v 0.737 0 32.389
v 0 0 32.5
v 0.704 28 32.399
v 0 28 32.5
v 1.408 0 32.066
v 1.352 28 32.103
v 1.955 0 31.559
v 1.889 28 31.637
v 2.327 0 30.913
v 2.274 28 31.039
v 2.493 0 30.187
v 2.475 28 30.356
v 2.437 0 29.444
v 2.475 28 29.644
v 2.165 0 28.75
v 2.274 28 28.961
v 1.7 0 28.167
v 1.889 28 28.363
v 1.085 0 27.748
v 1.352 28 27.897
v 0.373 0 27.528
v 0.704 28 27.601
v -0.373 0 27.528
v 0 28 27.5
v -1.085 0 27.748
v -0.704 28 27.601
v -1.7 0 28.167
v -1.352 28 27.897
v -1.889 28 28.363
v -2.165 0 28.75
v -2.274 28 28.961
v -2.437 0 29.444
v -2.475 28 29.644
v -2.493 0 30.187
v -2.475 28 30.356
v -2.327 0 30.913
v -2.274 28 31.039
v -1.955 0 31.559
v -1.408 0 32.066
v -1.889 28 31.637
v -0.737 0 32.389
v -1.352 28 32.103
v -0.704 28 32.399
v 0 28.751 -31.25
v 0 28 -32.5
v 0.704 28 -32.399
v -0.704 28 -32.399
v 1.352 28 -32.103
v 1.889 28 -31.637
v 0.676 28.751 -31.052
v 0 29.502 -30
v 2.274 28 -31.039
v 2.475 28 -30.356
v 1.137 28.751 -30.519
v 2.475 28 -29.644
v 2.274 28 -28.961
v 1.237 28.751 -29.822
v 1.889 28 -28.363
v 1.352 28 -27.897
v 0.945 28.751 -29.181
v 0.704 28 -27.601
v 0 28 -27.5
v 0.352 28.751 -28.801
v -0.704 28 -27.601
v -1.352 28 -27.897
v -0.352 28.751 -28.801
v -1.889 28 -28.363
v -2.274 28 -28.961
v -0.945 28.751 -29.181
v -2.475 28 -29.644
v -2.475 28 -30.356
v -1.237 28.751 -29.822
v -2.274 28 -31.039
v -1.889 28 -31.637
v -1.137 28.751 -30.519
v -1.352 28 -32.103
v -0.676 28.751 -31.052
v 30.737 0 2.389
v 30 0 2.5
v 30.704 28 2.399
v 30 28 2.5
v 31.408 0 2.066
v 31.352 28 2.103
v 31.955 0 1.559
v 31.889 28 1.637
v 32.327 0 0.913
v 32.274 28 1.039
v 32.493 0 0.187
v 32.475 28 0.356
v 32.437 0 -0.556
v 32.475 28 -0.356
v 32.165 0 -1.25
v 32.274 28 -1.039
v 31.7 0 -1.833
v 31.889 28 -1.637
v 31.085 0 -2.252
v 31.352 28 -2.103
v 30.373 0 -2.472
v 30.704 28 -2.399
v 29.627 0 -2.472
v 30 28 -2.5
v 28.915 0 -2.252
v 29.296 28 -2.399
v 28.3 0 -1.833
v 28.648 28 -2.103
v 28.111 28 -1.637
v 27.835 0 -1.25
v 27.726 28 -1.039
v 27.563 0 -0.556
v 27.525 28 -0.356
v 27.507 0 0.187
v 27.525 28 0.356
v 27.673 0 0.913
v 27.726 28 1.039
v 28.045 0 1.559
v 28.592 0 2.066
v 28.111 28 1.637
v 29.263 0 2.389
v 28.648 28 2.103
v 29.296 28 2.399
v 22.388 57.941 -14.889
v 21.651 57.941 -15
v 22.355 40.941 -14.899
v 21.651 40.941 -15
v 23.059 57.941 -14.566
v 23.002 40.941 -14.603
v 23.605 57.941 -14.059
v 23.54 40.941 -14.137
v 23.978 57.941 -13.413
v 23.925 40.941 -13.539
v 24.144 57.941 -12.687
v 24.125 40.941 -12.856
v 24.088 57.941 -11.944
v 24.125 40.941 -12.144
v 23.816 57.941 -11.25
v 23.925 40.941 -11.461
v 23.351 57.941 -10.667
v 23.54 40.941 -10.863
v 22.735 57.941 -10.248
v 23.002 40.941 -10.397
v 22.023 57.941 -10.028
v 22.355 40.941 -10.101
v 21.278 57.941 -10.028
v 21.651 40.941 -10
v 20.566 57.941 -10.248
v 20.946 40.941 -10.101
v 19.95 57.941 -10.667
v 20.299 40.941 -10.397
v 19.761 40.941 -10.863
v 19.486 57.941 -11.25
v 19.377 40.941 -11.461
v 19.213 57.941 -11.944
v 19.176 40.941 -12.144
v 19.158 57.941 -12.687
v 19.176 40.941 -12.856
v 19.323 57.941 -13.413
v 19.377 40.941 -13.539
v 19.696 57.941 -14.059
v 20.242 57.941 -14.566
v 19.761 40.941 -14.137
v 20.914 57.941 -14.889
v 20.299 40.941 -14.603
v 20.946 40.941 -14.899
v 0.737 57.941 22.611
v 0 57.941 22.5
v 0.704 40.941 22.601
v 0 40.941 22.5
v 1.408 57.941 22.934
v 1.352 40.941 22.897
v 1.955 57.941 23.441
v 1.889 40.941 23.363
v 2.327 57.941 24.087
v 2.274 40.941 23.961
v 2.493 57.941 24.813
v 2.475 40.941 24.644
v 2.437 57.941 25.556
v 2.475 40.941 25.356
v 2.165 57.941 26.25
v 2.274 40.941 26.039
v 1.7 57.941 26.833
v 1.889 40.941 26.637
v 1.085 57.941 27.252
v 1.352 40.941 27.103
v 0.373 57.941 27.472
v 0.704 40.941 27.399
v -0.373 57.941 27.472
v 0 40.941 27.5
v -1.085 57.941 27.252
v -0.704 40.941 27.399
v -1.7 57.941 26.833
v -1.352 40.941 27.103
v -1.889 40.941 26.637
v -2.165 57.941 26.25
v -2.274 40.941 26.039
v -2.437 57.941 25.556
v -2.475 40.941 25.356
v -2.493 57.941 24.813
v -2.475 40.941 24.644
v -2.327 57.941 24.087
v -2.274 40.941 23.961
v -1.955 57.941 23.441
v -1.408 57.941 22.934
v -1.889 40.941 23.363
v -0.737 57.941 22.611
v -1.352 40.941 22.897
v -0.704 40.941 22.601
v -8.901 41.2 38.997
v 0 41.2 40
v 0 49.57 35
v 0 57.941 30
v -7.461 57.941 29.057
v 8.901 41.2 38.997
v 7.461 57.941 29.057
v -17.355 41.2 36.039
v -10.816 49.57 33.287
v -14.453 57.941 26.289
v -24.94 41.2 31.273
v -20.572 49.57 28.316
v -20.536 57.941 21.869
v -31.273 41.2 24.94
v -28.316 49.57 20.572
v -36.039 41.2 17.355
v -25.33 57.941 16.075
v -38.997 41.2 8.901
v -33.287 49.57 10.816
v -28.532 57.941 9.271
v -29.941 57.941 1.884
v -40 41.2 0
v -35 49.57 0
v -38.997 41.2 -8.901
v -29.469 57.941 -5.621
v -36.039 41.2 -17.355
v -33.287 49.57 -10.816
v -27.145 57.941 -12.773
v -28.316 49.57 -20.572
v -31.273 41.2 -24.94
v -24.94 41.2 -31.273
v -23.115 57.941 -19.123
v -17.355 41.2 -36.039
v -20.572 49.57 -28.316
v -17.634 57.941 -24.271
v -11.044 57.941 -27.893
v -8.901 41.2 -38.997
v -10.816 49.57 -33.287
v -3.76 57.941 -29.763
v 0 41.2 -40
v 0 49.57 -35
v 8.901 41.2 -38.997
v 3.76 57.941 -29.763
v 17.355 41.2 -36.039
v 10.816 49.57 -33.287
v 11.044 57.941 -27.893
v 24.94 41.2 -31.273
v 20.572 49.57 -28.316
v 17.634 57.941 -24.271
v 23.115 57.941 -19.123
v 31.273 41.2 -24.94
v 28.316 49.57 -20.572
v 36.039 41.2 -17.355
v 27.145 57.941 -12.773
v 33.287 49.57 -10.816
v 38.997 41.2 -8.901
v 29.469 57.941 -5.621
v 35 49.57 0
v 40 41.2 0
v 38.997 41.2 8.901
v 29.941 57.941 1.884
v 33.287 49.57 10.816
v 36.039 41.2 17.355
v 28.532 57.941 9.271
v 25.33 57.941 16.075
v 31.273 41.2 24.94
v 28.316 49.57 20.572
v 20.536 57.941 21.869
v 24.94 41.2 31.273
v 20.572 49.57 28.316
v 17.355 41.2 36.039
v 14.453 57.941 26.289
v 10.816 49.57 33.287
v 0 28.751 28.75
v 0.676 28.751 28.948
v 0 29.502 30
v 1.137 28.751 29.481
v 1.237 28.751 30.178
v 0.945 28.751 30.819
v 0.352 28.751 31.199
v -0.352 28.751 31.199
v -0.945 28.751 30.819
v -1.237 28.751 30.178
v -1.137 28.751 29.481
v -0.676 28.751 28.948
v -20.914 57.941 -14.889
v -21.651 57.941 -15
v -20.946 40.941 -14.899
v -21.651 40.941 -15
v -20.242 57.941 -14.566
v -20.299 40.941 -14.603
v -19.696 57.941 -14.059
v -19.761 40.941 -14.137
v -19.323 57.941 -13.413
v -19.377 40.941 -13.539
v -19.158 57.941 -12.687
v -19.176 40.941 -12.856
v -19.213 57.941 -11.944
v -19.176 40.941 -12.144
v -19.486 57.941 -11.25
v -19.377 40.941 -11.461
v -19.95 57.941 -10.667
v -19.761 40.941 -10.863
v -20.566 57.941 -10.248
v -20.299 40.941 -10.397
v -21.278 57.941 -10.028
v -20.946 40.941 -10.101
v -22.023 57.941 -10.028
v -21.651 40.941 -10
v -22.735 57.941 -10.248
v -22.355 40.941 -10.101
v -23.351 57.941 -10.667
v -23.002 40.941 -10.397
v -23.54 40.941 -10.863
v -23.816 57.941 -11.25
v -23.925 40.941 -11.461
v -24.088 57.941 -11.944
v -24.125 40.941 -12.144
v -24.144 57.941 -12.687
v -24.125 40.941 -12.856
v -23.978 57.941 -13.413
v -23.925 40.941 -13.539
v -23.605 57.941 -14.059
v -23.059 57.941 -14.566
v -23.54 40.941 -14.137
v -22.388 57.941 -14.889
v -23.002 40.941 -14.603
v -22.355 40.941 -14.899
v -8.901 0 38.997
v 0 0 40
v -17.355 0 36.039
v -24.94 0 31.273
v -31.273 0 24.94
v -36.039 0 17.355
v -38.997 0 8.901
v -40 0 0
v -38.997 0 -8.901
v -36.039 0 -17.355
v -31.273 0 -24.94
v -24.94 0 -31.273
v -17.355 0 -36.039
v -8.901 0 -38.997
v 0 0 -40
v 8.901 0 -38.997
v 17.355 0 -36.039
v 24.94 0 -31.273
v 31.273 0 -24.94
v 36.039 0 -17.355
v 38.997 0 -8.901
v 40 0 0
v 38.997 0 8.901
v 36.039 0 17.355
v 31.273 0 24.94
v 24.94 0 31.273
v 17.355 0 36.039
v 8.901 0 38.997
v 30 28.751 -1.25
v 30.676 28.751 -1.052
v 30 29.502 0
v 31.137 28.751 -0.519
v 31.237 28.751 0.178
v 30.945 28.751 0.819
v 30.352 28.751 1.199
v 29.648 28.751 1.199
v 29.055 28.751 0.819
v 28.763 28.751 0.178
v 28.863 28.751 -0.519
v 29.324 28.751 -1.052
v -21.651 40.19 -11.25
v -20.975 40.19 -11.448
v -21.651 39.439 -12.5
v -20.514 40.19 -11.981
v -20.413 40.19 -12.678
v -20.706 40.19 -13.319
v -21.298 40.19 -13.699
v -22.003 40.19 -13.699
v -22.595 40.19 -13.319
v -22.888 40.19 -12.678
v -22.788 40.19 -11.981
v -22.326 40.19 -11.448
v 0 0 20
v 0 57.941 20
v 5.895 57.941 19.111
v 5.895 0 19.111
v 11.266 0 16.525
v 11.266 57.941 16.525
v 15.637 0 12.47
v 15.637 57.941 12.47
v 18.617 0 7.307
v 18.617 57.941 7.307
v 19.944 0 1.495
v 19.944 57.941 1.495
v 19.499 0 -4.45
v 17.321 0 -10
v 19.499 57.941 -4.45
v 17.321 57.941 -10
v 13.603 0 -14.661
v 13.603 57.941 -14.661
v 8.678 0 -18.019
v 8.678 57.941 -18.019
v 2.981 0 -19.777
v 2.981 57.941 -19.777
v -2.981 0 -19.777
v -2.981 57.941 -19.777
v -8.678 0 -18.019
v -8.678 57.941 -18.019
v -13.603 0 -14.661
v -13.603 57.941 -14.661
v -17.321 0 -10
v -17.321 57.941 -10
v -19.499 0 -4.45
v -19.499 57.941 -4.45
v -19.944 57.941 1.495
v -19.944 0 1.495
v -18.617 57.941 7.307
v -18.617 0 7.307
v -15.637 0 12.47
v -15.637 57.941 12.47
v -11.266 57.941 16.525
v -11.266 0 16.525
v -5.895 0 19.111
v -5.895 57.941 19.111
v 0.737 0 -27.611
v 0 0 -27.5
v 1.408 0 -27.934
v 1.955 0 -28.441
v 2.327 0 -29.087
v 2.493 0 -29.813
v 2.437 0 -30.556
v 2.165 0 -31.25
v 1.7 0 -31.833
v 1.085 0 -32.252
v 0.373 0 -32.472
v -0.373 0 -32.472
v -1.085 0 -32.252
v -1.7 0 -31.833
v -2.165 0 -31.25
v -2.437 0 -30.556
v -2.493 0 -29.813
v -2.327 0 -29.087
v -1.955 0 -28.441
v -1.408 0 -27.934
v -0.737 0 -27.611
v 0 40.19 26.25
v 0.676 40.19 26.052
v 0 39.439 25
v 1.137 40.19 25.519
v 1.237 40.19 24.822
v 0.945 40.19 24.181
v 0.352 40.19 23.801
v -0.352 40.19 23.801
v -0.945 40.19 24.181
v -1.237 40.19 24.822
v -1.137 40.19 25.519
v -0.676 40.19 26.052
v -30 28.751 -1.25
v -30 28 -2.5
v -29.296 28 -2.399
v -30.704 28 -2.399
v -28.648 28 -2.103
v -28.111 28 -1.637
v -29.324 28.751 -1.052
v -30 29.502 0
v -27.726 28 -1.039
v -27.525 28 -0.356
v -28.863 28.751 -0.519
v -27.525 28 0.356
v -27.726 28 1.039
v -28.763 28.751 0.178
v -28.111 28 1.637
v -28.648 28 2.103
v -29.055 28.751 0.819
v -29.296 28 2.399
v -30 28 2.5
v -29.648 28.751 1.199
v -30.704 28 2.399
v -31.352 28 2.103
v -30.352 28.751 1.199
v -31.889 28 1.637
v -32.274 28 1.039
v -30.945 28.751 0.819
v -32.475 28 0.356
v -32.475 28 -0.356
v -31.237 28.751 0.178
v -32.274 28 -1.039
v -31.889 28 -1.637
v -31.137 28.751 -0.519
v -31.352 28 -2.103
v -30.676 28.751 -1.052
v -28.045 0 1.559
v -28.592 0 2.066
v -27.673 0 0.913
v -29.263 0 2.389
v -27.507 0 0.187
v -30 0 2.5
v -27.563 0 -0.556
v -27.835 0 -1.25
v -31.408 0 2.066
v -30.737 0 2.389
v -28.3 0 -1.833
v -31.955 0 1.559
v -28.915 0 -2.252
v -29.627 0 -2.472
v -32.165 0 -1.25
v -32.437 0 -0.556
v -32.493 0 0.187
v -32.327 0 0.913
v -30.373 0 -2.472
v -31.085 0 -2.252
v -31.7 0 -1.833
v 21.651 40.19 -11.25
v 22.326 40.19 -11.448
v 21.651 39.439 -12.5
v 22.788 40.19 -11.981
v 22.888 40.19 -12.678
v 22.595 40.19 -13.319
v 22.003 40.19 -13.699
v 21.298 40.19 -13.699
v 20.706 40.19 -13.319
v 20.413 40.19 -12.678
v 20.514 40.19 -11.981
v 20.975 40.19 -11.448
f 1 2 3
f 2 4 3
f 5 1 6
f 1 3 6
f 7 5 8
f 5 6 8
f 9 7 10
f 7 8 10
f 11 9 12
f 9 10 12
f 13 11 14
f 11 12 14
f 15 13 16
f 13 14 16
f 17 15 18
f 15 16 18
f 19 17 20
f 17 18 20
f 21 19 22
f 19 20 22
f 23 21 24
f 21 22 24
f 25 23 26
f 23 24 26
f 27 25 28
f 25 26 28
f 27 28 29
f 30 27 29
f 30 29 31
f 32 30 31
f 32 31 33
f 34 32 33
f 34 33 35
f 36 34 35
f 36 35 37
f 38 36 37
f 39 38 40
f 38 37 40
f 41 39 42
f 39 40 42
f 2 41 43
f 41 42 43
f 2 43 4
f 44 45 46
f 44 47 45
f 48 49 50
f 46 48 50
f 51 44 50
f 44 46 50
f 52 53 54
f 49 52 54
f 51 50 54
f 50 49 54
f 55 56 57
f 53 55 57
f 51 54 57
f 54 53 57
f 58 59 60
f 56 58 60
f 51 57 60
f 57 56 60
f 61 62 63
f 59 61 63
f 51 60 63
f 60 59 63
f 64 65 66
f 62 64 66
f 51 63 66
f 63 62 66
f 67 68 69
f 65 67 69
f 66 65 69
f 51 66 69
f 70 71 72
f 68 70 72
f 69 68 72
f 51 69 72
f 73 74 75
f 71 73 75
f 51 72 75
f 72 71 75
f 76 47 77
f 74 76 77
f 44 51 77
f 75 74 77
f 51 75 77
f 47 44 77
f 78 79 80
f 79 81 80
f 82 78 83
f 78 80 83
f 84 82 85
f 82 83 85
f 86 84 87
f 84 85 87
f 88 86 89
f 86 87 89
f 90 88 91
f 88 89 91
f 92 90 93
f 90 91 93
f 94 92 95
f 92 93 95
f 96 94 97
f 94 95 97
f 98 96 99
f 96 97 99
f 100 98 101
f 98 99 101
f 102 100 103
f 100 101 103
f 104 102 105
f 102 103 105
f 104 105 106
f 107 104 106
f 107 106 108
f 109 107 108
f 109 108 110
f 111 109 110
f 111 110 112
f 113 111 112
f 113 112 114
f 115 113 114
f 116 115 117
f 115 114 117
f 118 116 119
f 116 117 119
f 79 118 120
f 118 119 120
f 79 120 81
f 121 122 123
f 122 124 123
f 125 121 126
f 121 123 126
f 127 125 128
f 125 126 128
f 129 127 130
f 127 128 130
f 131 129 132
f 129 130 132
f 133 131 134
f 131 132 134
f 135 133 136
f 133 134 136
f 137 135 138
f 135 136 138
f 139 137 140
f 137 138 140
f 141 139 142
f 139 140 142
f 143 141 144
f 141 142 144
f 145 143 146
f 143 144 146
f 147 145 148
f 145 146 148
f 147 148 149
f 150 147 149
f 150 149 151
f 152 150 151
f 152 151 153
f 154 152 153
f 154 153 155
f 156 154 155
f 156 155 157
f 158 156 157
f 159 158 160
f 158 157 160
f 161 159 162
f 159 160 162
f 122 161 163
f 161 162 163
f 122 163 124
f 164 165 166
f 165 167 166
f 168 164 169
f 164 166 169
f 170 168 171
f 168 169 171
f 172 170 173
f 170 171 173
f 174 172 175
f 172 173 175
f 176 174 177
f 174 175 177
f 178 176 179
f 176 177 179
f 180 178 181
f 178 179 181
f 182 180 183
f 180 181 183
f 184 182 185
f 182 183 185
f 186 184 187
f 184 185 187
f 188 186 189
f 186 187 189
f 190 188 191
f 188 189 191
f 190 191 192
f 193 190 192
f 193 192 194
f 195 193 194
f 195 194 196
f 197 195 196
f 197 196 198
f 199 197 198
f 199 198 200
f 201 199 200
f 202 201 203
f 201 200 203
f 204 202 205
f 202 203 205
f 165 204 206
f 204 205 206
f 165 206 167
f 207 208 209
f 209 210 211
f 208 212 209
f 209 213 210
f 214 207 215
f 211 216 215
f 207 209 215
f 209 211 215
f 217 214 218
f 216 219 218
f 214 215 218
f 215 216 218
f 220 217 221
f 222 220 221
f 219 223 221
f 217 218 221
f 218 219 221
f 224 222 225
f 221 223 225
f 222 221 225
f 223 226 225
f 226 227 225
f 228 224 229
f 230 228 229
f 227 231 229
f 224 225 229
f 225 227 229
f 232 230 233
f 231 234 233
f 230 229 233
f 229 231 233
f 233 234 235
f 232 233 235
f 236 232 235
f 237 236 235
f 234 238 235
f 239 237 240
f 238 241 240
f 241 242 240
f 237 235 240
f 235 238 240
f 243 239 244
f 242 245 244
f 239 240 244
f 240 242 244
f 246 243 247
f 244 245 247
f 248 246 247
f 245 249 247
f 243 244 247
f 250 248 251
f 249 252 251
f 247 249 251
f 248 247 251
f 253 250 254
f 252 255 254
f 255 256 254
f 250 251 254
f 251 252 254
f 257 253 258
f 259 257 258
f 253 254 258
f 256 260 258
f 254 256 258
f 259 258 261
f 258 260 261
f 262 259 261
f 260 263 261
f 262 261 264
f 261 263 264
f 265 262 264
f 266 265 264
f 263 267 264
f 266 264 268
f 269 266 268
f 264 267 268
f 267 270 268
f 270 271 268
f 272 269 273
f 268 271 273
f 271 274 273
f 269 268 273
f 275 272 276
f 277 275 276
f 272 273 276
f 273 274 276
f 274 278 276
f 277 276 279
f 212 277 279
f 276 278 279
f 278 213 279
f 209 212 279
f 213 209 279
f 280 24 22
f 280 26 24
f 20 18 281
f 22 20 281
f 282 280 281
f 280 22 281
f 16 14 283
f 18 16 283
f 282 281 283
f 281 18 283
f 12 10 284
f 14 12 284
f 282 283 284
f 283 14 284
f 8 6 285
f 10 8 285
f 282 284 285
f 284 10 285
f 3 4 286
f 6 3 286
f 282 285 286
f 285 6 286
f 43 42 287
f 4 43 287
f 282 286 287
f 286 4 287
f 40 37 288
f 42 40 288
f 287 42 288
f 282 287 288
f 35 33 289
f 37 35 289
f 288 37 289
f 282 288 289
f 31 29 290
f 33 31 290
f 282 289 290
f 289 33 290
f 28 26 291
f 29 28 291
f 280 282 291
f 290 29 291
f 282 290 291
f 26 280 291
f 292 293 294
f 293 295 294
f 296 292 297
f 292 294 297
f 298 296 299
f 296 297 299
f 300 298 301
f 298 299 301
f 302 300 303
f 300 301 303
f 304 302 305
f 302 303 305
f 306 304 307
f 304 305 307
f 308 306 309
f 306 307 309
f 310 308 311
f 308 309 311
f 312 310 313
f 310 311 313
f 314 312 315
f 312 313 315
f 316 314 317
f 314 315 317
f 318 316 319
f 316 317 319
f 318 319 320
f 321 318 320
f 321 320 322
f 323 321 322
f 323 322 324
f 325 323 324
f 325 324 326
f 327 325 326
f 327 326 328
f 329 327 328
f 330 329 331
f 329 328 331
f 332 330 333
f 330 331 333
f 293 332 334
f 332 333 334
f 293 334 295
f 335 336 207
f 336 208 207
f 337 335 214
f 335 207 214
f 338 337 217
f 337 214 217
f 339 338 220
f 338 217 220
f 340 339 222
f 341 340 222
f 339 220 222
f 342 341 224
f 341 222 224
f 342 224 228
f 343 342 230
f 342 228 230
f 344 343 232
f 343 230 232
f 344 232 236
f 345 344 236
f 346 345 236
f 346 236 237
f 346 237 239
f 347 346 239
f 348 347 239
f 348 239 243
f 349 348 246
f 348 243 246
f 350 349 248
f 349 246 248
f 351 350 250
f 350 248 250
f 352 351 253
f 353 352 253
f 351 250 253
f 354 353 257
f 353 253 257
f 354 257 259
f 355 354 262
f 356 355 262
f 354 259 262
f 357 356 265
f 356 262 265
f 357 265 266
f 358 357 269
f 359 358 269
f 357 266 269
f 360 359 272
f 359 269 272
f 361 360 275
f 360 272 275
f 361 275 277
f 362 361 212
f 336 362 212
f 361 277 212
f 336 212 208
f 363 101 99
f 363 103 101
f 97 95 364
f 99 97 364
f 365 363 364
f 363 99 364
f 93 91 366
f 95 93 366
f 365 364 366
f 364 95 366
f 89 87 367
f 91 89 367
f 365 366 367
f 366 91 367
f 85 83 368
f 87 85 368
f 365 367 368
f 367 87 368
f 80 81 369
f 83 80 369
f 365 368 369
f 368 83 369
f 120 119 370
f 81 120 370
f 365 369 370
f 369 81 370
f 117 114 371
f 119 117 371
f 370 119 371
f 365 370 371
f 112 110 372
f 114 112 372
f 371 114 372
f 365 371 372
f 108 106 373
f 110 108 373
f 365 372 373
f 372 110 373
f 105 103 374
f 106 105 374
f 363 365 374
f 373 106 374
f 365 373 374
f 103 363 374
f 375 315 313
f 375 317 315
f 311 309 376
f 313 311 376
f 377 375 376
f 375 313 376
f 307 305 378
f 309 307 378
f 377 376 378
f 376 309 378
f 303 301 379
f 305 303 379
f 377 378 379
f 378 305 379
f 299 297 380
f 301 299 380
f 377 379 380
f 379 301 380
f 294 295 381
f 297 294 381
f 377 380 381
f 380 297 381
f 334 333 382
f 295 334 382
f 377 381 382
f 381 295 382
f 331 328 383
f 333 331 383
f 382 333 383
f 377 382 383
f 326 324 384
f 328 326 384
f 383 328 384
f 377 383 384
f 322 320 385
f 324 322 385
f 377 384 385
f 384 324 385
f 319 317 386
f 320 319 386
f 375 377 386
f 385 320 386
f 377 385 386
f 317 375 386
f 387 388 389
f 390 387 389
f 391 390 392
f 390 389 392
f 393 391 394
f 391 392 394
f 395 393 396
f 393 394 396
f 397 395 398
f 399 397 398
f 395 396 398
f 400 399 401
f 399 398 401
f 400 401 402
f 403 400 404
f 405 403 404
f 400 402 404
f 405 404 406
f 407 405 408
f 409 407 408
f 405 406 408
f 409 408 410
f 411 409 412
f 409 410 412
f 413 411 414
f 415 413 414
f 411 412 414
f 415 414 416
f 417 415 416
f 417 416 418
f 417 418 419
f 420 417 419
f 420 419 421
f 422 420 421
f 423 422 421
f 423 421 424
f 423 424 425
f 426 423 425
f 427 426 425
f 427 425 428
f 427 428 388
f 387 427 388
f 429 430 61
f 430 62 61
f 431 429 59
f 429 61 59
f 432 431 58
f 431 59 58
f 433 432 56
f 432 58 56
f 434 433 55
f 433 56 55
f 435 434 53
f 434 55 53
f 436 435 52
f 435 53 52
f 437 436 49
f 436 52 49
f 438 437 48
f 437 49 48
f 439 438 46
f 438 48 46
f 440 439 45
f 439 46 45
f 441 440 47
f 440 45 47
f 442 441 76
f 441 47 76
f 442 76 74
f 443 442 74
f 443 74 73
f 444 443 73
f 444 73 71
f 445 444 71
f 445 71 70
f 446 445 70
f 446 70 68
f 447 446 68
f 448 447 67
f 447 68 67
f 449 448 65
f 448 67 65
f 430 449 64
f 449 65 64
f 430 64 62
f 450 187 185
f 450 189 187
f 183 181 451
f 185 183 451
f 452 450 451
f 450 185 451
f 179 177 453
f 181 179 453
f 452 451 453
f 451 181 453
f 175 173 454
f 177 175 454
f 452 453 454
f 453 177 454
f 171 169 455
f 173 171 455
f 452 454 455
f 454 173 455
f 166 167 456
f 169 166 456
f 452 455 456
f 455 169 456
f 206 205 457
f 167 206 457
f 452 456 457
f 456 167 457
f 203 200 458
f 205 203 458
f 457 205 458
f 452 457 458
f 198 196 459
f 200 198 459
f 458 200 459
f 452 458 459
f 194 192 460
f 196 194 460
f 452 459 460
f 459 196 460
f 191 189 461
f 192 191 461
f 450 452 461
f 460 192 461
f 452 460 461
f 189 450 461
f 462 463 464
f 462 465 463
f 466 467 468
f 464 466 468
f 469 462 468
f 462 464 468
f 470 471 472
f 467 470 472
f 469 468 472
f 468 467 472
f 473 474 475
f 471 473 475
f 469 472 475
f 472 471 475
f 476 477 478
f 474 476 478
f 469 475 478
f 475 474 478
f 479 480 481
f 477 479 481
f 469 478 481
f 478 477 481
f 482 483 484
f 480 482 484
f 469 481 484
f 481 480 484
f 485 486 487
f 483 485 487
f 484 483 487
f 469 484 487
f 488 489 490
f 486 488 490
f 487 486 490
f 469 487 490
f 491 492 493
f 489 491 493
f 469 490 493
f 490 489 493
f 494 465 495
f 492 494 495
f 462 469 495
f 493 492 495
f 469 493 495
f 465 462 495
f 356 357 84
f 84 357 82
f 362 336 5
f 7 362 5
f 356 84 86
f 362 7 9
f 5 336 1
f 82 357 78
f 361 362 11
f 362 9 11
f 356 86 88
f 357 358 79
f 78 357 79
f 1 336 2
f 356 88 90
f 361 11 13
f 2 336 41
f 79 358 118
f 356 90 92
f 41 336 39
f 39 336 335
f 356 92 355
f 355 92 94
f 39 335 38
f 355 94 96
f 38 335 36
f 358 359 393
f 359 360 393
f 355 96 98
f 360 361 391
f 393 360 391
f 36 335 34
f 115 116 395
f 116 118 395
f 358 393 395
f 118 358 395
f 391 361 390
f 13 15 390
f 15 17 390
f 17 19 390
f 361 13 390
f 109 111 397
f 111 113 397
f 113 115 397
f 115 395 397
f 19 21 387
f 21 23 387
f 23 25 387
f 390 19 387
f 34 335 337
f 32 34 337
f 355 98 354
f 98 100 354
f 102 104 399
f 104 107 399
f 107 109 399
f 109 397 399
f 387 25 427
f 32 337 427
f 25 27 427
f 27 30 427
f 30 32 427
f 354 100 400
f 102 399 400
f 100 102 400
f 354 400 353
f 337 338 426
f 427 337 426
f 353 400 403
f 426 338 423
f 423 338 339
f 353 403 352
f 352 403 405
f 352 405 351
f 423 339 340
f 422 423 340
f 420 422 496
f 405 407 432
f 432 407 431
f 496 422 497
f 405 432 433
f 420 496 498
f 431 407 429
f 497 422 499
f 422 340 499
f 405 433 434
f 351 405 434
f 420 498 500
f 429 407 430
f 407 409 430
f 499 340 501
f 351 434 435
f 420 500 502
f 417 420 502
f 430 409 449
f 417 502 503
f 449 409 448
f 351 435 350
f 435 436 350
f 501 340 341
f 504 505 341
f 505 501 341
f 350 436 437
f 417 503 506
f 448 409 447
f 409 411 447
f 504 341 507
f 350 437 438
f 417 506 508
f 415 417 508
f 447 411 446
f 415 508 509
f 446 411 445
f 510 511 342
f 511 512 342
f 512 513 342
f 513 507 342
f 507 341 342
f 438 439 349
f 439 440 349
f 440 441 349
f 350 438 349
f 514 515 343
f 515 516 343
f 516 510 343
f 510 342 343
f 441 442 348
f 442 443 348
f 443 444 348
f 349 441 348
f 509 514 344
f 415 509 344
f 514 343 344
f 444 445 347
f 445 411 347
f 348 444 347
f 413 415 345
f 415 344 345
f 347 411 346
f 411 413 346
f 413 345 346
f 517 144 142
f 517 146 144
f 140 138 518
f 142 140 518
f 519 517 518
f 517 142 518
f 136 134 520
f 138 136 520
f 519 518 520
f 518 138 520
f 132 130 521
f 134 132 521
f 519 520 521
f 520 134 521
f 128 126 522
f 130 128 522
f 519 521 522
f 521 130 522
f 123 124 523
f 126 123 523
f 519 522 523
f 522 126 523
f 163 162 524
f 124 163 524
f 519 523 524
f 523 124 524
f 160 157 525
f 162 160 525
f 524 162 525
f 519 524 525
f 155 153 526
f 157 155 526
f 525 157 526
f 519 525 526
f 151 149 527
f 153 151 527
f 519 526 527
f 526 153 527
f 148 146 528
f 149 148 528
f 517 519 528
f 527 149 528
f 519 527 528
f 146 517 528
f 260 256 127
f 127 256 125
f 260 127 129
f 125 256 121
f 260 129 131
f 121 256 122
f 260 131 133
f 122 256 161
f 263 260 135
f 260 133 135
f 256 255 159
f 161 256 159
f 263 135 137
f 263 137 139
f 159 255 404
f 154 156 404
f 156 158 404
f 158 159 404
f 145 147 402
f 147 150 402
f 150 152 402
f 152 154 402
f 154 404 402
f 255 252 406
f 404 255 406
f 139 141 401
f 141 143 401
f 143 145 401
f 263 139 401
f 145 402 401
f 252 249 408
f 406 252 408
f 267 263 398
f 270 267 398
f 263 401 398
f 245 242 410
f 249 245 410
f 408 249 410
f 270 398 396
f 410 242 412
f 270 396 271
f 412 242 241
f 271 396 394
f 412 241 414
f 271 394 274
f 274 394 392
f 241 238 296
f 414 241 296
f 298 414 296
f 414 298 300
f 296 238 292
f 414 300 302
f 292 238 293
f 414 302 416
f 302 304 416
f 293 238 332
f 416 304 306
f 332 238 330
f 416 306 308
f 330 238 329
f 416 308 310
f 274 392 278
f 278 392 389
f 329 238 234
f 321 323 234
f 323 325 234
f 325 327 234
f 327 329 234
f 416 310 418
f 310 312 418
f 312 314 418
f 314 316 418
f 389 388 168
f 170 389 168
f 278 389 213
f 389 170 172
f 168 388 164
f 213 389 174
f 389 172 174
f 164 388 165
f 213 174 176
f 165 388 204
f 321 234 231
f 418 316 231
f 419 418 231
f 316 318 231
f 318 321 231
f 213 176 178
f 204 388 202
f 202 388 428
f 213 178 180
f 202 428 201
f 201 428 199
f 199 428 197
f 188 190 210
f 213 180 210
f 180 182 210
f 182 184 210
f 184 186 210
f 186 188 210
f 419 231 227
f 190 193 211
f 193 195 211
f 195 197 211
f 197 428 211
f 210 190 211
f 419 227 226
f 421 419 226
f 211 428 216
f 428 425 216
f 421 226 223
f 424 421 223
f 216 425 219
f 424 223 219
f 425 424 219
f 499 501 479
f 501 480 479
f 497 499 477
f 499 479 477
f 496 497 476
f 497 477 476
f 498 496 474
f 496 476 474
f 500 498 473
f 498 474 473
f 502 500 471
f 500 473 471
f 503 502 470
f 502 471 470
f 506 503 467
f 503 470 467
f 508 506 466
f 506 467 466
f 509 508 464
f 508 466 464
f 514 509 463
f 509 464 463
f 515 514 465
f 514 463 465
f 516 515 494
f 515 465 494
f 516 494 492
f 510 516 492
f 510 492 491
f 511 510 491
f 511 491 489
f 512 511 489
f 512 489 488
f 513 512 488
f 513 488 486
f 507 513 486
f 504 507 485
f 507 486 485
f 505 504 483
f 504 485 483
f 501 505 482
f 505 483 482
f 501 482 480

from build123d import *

# Parameters (mm, degrees)
ESQUISSE2_R             = 20
ENL_V_MAT_EXTRU_1_DEPTH = 58.940669043
TROU_TARAUD_M61_D       = 5
TROU_TARAUD_M61_DEPTH   = 17
TROU_TARAUD_M61_TIP     = 1.502151548
TROU_TARAUD_M62_D       = 5
TROU_TARAUD_M62_DEPTH   = 28
TROU_TARAUD_M62_TIP     = 1.502151548


with BuildPart() as part:
    # Esquisse1 → Révolution1 (revolve)
    with BuildSketch(Plane.XY, mode=Mode.PRIVATE) as r_volution1_sk:
        Polygon((0, 0), (40, 0), (40, 41.2), (30, 57.940669043), (0, 57.940669043), align=None)
    revolve(r_volution1_sk.sketch.rotate(Axis((0, 57.940669043, 0), (0, -1, 0)), 90), axis=Axis((0, 57.940669043, 0), (0, -1, 0)))  # turned: the seam where the file's is

    # Esquisse2 → Enlèv. mat.-Extru.1 (cut, through all)
    with BuildSketch(Plane(origin=(0, 57.940669043, 0), x_dir=(1, 0, 0), z_dir=(0, 1, 0))):
        with Locations(Location((0, 0, 0), (0, 0, 270))):  # turned: the seam where the file's is
            Circle(ESQUISSE2_R)
    extrude(amount=-ENL_V_MAT_EXTRU_1_DEPTH, mode=Mode.SUBTRACT)

    # Trou taraudé M61
    with Locations(Plane(origin=(-21.650635095, 57.940669043, -12.5), x_dir=(0, 0, 1), z_dir=(0, 1, 0))):
        with Locations((0, 0), (0, 43.30127019), (37.5, 21.650635095)):
            Hole(TROU_TARAUD_M61_D / 2, depth=TROU_TARAUD_M61_DEPTH)
            with Locations((0, 0, -(TROU_TARAUD_M61_DEPTH + TROU_TARAUD_M61_TIP / 2))):  # 118° drill point
                Cone(0, TROU_TARAUD_M61_D / 2, TROU_TARAUD_M61_TIP, mode=Mode.SUBTRACT)

    # Trou taraudé M62
    with Locations(Plane(origin=(0, 0, 30), x_dir=(0, 0, -1), z_dir=(0, -1, 0))):
        with Locations((0, 0), (30, 30), (60, 0), (30, -30)):
            Hole(TROU_TARAUD_M62_D / 2, depth=TROU_TARAUD_M62_DEPTH)
            with Locations((0, 0, -(TROU_TARAUD_M62_DEPTH + TROU_TARAUD_M62_TIP / 2))):  # 118° drill point
                Cone(0, TROU_TARAUD_M62_D / 2, TROU_TARAUD_M62_TIP, mode=Mode.SUBTRACT)


solid = part.part
